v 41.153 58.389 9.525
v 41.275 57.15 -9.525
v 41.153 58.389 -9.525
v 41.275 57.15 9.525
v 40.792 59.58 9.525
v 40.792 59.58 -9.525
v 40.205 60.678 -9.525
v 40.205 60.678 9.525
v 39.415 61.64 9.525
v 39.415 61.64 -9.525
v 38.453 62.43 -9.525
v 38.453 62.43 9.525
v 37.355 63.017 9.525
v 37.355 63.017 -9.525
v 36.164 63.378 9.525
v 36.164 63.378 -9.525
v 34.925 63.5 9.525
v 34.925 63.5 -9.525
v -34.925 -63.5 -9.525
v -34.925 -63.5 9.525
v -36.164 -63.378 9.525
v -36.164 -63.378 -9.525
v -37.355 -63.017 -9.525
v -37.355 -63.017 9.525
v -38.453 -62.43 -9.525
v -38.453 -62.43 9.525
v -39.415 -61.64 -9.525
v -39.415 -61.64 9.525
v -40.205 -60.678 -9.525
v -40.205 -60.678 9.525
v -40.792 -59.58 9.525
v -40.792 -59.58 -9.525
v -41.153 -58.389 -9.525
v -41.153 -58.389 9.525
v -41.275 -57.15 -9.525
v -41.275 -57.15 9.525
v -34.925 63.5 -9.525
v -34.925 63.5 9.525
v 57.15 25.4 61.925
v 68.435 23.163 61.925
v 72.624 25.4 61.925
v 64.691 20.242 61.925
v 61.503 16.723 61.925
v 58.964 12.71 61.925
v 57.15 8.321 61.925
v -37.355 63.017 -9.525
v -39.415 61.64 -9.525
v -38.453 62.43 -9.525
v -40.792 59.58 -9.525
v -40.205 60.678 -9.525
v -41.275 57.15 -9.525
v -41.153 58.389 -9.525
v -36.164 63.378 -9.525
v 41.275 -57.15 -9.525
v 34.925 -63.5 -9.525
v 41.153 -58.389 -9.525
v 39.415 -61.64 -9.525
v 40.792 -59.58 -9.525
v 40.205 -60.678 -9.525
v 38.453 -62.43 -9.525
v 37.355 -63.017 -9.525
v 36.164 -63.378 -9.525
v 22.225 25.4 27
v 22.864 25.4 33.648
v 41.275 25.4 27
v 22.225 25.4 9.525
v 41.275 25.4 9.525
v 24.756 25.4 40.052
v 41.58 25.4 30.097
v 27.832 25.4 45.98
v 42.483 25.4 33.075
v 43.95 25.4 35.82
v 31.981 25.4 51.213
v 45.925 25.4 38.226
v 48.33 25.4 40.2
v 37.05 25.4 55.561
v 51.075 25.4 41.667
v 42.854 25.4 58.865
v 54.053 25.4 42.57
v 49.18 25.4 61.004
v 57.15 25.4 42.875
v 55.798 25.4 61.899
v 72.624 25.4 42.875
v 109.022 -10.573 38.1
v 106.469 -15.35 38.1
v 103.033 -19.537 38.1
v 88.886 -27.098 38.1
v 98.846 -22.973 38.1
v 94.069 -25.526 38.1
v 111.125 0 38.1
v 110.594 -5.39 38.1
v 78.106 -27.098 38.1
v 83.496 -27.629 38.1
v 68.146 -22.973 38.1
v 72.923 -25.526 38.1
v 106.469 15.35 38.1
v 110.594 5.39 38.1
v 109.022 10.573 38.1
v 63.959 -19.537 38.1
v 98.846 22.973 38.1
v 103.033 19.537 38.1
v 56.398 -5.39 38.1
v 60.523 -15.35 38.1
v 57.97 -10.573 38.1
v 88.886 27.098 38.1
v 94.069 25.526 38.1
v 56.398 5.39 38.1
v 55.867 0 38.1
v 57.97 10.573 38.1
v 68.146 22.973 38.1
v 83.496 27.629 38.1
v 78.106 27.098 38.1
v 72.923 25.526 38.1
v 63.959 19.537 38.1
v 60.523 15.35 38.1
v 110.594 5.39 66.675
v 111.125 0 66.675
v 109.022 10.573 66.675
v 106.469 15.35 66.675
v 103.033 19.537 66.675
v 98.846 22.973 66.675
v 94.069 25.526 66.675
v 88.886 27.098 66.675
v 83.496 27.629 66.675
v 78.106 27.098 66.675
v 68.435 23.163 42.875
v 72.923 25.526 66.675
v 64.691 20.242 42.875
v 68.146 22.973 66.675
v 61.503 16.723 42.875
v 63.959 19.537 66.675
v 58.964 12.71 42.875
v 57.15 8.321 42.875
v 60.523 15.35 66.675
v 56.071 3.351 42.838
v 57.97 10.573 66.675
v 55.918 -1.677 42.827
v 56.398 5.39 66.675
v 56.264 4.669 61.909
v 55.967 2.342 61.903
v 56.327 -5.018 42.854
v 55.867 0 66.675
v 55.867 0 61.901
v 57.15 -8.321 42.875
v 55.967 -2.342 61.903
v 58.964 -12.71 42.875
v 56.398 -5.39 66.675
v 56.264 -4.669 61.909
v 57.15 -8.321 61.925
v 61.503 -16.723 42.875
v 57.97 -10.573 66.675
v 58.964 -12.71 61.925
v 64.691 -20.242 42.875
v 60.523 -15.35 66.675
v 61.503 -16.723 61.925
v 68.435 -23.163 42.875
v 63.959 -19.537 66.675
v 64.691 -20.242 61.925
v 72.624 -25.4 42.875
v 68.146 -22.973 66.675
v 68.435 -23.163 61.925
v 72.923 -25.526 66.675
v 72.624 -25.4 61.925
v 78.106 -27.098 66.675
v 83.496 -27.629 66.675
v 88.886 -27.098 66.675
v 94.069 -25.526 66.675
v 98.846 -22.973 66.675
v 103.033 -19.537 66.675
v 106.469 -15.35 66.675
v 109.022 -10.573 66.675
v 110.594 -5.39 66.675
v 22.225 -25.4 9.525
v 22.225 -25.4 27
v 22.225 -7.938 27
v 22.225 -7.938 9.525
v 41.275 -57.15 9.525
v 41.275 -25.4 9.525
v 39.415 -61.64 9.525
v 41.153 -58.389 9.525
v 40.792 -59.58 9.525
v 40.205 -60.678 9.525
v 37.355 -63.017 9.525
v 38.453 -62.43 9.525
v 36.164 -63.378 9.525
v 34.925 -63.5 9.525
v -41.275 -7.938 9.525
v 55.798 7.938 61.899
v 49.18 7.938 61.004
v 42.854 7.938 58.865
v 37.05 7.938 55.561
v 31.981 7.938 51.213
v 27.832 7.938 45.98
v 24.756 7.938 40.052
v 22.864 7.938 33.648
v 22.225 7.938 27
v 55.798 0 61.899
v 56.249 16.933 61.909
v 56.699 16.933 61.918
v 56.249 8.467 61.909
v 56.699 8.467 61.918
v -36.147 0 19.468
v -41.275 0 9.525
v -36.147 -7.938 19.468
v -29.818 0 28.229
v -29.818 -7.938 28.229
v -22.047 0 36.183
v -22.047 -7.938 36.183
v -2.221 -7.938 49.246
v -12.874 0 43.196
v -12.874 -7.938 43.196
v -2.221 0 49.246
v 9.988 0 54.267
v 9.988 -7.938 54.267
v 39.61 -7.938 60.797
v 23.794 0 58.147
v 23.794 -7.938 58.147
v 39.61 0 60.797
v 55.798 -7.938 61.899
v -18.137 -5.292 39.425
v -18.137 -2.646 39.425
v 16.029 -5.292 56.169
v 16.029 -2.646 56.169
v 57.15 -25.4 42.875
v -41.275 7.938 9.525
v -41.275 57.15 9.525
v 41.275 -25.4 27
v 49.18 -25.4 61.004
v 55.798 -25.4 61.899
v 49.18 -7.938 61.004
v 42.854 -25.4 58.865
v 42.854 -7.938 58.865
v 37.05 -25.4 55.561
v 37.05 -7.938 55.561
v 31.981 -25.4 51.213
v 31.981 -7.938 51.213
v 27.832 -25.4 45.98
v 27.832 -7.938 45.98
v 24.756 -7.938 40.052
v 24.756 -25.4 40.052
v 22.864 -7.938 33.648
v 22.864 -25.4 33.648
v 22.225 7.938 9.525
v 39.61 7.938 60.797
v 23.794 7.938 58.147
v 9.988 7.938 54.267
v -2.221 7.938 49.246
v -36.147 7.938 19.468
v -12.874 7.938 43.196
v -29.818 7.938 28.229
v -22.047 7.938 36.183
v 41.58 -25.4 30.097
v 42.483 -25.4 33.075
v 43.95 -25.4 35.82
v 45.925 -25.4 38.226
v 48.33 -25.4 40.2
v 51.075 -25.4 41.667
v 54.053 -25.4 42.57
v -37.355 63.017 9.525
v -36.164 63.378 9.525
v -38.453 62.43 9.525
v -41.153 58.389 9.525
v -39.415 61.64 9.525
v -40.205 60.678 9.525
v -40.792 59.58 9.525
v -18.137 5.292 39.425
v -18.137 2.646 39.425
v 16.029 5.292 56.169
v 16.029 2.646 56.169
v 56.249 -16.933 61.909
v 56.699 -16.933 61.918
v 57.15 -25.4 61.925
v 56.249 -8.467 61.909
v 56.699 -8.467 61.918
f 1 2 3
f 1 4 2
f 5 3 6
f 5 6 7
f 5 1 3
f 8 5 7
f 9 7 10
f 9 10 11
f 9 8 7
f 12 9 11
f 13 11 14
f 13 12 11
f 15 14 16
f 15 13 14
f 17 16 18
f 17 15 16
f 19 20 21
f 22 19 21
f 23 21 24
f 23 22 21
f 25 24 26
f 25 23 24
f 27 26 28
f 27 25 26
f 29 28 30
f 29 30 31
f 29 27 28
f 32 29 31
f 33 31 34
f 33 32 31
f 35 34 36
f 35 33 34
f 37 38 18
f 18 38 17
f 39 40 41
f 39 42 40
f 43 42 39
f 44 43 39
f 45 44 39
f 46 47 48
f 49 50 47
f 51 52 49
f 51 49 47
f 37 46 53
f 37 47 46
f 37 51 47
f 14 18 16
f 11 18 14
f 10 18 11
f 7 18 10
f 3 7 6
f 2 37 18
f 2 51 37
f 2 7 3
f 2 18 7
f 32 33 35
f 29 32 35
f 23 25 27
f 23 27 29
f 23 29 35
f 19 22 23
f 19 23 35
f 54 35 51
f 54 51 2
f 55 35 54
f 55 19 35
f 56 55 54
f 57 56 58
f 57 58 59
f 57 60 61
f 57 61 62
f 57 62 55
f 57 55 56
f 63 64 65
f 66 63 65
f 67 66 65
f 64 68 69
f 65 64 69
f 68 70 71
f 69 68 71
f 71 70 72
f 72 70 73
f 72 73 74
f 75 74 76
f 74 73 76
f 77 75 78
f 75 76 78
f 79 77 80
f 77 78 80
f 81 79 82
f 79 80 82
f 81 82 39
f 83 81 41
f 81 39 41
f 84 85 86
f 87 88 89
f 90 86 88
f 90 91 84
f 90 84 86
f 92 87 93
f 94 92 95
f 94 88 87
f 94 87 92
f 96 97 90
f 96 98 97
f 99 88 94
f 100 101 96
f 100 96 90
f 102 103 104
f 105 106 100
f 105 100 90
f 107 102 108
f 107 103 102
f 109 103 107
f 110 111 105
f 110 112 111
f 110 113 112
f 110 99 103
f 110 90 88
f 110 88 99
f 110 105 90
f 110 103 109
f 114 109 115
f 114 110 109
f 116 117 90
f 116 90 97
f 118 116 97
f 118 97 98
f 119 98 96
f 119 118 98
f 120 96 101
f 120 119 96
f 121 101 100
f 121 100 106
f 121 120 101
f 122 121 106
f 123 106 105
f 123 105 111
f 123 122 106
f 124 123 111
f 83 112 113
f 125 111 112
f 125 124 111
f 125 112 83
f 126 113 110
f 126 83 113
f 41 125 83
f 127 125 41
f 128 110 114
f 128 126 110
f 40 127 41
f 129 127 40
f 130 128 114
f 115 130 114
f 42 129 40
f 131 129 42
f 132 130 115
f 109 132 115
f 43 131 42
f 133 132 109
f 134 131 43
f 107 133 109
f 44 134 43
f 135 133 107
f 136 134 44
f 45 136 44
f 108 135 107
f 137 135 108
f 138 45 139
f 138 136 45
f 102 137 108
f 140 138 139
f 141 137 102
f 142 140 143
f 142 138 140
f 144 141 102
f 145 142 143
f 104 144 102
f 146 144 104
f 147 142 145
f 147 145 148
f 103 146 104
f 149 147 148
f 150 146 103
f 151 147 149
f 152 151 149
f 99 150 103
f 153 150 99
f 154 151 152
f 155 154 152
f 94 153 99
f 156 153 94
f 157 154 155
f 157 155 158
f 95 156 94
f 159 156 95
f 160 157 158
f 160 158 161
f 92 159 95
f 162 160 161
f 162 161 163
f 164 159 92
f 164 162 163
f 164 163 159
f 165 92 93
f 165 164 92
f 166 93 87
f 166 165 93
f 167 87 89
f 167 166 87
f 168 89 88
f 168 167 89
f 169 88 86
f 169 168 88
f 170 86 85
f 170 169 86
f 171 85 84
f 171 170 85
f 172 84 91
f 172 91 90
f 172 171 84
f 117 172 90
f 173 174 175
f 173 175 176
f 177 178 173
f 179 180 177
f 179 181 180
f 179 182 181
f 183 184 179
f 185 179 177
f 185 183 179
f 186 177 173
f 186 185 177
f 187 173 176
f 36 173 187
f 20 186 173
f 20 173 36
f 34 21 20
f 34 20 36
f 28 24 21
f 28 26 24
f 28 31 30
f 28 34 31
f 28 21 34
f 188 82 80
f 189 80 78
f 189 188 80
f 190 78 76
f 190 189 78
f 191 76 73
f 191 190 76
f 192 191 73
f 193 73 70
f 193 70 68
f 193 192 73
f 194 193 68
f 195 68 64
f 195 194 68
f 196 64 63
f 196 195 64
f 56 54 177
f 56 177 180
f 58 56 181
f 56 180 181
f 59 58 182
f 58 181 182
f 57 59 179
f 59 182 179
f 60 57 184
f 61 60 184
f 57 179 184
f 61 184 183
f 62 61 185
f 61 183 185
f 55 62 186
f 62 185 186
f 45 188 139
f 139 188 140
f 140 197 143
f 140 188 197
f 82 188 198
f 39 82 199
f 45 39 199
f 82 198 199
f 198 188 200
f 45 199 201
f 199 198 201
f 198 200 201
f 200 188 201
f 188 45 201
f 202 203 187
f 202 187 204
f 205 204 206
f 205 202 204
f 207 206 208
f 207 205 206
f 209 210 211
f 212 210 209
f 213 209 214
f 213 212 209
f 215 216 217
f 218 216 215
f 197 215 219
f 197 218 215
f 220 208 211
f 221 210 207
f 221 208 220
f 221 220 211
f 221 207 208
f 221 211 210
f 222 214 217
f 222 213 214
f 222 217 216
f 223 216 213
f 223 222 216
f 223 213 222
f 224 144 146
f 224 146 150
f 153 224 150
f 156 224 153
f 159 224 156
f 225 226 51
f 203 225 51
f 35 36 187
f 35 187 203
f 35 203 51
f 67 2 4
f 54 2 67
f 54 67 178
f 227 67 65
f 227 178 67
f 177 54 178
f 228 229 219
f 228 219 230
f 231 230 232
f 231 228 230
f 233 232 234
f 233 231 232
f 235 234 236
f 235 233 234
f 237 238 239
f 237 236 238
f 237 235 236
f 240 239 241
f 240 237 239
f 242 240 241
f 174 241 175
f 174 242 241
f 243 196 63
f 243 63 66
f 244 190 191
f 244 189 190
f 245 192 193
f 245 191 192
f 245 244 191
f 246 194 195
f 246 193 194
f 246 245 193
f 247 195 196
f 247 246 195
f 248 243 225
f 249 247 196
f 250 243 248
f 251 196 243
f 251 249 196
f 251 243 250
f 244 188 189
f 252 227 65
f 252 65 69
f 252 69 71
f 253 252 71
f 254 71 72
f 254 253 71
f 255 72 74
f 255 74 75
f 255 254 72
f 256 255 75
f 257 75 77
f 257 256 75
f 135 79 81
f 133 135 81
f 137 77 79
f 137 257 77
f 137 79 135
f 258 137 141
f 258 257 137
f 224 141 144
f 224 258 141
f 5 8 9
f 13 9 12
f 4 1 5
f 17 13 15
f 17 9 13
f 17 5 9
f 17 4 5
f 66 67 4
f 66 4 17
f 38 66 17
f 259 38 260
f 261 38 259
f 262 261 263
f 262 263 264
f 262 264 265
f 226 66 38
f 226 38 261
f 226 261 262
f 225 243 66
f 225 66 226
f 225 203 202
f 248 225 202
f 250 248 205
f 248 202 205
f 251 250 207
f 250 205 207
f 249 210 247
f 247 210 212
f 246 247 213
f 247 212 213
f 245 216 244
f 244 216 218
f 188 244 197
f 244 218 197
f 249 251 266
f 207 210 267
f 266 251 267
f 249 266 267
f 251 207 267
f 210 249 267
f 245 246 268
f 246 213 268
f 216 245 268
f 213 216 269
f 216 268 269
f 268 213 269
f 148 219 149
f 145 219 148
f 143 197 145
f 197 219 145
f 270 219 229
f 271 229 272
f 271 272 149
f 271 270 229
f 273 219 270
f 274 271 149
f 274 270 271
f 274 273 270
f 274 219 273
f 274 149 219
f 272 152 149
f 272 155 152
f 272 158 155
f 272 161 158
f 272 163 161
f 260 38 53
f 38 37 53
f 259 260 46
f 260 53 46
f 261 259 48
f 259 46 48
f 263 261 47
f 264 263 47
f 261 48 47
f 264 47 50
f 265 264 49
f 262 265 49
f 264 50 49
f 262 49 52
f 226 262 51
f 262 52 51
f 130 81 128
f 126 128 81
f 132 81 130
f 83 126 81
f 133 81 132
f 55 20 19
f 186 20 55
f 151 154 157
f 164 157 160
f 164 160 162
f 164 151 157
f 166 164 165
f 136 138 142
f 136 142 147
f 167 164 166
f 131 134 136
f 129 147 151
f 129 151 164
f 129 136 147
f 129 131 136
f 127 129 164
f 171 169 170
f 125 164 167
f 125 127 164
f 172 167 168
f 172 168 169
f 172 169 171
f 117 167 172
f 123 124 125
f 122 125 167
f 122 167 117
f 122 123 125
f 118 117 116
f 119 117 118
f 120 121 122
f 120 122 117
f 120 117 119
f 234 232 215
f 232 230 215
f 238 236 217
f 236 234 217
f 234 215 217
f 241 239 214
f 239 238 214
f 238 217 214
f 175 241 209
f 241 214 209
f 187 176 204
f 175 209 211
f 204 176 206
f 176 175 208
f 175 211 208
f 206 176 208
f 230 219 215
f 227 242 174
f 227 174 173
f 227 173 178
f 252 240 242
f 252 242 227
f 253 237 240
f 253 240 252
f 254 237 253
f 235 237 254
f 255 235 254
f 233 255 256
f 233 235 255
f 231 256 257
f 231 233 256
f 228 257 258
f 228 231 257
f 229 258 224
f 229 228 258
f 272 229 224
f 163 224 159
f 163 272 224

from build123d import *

# Parameters (mm, degrees)
F1_DEPTH = 63.5
F0_W     = 23.171081849
F0_H     = 19.05
F2_DEPTH = 25.4
F3_DEPTH = 7.9375
F5_R     = 6.35


with BuildPart() as f1:
    # F0 (on Front) → F1 (new body, symmetric)
    with BuildSketch(Plane.XZ):
        Polygon((22.225, 9.525), (-41.275, 9.525), (-41.275, -9.525), (41.275, -9.525), (41.275, 9.525), align=None)
    extrude(amount=F1_DEPTH, both=True)

    # F0 (on Front) → F2 (join, symmetric)
    with BuildSketch(Plane.XZ):
        with Locations((71.9105409245, 52.4002)):
            Rectangle(F0_W, F0_H)
        with BuildLine():
            Line((22.225, 27.0002), (22.225, 9.525))
            Line((22.225, 9.525), (41.275, 9.525))
            Line((41.275, 9.525), (41.275, 27.0002))
            ThreePointArc((41.275, 27.0002), (45.9246798487, 38.2255201513), (57.15, 42.8752))
            Line((57.15, 42.8752), (60.325, 42.8752))
            Line((60.325, 42.8752), (60.325, 61.9252))
            Line((60.325, 61.9252), (57.15, 61.9252))
            add(Edge.make_bspline(
                [(55.7982156024, 61.8990295497), (56.2487884274, 61.909374971), (56.6993942137, 61.9180941174), (57.15, 61.9252)],
                knots=[110.2855018647, 110.2855018647, 110.2855018647, 110.2855018647, 111.5045361635, 111.5045361635, 111.5045361635, 111.5045361635], degree=3))
            ThreePointArc((55.7982156024, 61.8990295497), (31.9809049121, 51.2132600597), (22.225, 27.0002))
        make_face()
    extrude(amount=F2_DEPTH, both=True)

    # F0 (on Front) → F3 (join, symmetric)
    with BuildSketch(Plane.XZ):
        with BuildLine():
            add(Edge.make_bspline(
                [(-41.275, 9.525), (-25.4582592858, 46.7164983248), (15.0350884427, 60.9630838009), (55.7982156024, 61.8990295497)],
                knots=[0, 0, 0, 0, 110.2855018647, 110.2855018647, 110.2855018647, 110.2855018647], degree=3))
            Line((-41.275, 9.525), (22.225, 9.525))
            Line((22.225, 9.525), (22.225, 27.0002))
            ThreePointArc((22.225, 27.0002), (31.9809049121, 51.2132600597), (55.7982156024, 61.8990295497))
        make_face()
    extrude(amount=F3_DEPTH, both=True)

    # F0 (on Front) → F4 (revolve)
    with BuildSketch(Plane.XZ):
        Polygon((83.496081849, 66.675), (83.496081849, 61.9252), (83.496081849, 42.8752), (83.496081849, 38.1), (111.125, 38.1), (111.125, 66.675), align=None)
    revolve(axis=Axis((83.496081849, 0, 52.3875), (0, 0, 1)))

    # F5
    f5_edges = [f1.edges().sort_by_distance(p)[0] for p in [
        (41.275, -63.5, 0),
        (-41.275, -63.5, 0),
        (41.275, 63.5, 0),
        (-41.275, 63.5, 0),
    ]]
    fillet(f5_edges, radius=F5_R)


solid = f1.part
